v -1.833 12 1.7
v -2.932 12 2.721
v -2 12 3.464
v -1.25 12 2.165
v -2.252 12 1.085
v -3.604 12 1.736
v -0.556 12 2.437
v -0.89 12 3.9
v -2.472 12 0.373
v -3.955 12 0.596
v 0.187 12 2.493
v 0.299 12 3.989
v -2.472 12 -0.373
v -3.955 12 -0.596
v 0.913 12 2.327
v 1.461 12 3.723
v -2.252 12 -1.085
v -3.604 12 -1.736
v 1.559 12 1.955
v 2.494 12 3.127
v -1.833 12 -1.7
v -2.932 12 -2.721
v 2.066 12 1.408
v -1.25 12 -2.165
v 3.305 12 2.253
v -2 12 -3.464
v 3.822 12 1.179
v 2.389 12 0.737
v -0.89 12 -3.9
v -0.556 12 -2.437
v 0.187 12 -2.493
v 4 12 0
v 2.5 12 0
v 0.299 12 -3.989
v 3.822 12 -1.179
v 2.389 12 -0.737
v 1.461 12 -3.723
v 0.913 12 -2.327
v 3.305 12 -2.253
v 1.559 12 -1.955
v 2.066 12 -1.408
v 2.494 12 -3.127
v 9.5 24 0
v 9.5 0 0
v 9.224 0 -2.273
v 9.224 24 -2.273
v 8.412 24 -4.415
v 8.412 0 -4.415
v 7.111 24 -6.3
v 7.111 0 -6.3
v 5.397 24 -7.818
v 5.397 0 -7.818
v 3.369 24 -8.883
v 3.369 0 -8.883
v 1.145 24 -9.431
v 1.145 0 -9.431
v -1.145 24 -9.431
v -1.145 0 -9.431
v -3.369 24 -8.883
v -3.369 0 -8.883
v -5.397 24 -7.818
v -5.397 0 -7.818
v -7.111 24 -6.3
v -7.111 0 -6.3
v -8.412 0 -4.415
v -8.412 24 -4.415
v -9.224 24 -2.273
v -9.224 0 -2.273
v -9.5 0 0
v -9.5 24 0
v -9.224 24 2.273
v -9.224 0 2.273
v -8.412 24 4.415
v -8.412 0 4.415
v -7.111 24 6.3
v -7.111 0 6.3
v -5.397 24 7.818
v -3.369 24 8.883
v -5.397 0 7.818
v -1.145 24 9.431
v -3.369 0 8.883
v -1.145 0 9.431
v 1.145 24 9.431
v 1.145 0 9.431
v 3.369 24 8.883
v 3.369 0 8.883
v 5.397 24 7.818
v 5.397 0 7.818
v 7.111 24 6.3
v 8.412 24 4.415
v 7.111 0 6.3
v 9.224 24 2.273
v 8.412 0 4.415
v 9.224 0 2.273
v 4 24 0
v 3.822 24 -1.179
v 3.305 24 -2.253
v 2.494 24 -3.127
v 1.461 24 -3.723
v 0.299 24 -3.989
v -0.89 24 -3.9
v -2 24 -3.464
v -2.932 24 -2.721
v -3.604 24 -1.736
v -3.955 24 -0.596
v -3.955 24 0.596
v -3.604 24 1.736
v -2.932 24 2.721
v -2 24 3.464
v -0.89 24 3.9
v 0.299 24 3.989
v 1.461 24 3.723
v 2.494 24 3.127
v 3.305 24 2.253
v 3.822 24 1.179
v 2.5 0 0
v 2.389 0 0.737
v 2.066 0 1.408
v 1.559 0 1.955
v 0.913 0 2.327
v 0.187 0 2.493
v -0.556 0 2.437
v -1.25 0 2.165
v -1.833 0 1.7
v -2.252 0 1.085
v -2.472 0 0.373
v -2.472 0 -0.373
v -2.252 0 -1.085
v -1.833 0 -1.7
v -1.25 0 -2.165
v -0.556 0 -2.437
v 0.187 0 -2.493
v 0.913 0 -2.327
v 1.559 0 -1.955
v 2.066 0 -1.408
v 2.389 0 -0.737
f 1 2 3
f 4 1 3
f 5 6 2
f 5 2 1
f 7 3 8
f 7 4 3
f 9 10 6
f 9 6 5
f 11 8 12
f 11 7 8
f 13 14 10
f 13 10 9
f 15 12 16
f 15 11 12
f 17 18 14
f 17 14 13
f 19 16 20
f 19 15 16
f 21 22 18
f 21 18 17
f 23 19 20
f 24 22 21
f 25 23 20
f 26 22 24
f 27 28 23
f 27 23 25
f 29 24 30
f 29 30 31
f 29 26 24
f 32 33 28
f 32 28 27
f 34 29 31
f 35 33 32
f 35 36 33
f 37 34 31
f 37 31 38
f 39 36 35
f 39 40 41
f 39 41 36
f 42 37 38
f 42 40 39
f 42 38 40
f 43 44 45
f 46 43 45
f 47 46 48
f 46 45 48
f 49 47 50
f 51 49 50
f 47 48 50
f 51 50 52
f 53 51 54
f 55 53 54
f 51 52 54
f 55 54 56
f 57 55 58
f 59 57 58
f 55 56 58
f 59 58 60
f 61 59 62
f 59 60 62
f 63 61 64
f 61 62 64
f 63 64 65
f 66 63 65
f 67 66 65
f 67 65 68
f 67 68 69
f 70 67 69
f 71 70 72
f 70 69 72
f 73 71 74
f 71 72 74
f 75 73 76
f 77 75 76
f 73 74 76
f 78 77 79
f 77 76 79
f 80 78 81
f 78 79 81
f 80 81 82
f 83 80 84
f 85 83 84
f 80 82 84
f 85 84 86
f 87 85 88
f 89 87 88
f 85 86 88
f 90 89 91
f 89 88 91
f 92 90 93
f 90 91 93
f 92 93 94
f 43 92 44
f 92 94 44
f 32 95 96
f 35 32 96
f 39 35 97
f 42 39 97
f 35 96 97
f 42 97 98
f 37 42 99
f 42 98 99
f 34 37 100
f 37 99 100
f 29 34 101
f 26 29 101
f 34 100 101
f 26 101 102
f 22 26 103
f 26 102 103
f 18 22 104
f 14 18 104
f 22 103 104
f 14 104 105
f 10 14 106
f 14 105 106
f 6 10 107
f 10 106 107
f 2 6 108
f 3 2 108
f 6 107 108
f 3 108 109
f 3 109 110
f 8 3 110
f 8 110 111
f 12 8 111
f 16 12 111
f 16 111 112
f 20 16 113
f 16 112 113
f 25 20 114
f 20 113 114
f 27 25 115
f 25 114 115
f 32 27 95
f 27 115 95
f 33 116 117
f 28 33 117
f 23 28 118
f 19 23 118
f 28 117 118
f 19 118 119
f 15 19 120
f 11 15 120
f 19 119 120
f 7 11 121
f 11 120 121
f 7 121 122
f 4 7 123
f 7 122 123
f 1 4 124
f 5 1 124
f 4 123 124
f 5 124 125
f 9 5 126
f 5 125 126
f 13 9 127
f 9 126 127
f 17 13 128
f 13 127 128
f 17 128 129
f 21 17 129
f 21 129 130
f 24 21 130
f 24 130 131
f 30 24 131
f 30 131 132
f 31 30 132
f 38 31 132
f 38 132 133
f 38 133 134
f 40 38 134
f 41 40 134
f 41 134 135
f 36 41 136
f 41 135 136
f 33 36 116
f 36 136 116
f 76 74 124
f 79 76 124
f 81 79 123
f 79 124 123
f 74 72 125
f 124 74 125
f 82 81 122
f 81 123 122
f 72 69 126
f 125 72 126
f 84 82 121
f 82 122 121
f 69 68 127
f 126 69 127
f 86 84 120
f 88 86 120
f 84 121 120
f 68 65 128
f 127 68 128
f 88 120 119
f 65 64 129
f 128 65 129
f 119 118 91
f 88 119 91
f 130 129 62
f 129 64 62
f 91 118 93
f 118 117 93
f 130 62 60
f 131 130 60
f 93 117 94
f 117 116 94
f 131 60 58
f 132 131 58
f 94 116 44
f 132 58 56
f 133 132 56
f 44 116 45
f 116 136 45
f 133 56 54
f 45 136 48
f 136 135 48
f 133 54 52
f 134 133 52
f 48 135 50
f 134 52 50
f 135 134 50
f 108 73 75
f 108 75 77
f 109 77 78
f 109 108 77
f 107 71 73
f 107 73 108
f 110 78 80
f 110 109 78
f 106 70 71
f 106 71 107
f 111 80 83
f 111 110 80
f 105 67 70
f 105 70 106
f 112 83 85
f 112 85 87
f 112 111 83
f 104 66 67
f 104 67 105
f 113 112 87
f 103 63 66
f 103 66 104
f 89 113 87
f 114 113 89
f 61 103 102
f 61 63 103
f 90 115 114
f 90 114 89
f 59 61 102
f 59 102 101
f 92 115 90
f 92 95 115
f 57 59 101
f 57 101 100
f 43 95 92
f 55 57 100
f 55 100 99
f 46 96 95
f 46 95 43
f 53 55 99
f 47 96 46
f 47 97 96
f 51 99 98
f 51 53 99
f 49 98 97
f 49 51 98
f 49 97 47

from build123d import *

# Parameters (mm, degrees)
SKETCH1_R           = 9.5
BOSS_EXTRUDE1_DEPTH = 24
SKETCH2_R           = 4
CUT_EXTRUDE1_DEPTH  = 12
SKETCH3_R           = 2.5
CUT_EXTRUDE2_DEPTH  = 12


with BuildPart() as part:
    # Sketch1 → Boss-Extrude1 (new body)
    with BuildSketch(Plane(origin=(0, 0, 0), x_dir=(1, 0, 0), z_dir=(0, 1, 0))):
        Circle(SKETCH1_R)
    extrude(amount=BOSS_EXTRUDE1_DEPTH)

    # Sketch2 → Cut-Extrude1 (cut)
    with BuildSketch(Plane(origin=(0, 24, 0), x_dir=(1, 0, 0), z_dir=(0, 1, 0))):
        Circle(SKETCH2_R)
    extrude(amount=-CUT_EXTRUDE1_DEPTH, mode=Mode.SUBTRACT)

    # Sketch3 → Cut-Extrude2 (cut)
    with BuildSketch(Plane.XZ):
        Circle(SKETCH3_R)
    extrude(amount=-CUT_EXTRUDE2_DEPTH, mode=Mode.SUBTRACT)


solid = part.part
